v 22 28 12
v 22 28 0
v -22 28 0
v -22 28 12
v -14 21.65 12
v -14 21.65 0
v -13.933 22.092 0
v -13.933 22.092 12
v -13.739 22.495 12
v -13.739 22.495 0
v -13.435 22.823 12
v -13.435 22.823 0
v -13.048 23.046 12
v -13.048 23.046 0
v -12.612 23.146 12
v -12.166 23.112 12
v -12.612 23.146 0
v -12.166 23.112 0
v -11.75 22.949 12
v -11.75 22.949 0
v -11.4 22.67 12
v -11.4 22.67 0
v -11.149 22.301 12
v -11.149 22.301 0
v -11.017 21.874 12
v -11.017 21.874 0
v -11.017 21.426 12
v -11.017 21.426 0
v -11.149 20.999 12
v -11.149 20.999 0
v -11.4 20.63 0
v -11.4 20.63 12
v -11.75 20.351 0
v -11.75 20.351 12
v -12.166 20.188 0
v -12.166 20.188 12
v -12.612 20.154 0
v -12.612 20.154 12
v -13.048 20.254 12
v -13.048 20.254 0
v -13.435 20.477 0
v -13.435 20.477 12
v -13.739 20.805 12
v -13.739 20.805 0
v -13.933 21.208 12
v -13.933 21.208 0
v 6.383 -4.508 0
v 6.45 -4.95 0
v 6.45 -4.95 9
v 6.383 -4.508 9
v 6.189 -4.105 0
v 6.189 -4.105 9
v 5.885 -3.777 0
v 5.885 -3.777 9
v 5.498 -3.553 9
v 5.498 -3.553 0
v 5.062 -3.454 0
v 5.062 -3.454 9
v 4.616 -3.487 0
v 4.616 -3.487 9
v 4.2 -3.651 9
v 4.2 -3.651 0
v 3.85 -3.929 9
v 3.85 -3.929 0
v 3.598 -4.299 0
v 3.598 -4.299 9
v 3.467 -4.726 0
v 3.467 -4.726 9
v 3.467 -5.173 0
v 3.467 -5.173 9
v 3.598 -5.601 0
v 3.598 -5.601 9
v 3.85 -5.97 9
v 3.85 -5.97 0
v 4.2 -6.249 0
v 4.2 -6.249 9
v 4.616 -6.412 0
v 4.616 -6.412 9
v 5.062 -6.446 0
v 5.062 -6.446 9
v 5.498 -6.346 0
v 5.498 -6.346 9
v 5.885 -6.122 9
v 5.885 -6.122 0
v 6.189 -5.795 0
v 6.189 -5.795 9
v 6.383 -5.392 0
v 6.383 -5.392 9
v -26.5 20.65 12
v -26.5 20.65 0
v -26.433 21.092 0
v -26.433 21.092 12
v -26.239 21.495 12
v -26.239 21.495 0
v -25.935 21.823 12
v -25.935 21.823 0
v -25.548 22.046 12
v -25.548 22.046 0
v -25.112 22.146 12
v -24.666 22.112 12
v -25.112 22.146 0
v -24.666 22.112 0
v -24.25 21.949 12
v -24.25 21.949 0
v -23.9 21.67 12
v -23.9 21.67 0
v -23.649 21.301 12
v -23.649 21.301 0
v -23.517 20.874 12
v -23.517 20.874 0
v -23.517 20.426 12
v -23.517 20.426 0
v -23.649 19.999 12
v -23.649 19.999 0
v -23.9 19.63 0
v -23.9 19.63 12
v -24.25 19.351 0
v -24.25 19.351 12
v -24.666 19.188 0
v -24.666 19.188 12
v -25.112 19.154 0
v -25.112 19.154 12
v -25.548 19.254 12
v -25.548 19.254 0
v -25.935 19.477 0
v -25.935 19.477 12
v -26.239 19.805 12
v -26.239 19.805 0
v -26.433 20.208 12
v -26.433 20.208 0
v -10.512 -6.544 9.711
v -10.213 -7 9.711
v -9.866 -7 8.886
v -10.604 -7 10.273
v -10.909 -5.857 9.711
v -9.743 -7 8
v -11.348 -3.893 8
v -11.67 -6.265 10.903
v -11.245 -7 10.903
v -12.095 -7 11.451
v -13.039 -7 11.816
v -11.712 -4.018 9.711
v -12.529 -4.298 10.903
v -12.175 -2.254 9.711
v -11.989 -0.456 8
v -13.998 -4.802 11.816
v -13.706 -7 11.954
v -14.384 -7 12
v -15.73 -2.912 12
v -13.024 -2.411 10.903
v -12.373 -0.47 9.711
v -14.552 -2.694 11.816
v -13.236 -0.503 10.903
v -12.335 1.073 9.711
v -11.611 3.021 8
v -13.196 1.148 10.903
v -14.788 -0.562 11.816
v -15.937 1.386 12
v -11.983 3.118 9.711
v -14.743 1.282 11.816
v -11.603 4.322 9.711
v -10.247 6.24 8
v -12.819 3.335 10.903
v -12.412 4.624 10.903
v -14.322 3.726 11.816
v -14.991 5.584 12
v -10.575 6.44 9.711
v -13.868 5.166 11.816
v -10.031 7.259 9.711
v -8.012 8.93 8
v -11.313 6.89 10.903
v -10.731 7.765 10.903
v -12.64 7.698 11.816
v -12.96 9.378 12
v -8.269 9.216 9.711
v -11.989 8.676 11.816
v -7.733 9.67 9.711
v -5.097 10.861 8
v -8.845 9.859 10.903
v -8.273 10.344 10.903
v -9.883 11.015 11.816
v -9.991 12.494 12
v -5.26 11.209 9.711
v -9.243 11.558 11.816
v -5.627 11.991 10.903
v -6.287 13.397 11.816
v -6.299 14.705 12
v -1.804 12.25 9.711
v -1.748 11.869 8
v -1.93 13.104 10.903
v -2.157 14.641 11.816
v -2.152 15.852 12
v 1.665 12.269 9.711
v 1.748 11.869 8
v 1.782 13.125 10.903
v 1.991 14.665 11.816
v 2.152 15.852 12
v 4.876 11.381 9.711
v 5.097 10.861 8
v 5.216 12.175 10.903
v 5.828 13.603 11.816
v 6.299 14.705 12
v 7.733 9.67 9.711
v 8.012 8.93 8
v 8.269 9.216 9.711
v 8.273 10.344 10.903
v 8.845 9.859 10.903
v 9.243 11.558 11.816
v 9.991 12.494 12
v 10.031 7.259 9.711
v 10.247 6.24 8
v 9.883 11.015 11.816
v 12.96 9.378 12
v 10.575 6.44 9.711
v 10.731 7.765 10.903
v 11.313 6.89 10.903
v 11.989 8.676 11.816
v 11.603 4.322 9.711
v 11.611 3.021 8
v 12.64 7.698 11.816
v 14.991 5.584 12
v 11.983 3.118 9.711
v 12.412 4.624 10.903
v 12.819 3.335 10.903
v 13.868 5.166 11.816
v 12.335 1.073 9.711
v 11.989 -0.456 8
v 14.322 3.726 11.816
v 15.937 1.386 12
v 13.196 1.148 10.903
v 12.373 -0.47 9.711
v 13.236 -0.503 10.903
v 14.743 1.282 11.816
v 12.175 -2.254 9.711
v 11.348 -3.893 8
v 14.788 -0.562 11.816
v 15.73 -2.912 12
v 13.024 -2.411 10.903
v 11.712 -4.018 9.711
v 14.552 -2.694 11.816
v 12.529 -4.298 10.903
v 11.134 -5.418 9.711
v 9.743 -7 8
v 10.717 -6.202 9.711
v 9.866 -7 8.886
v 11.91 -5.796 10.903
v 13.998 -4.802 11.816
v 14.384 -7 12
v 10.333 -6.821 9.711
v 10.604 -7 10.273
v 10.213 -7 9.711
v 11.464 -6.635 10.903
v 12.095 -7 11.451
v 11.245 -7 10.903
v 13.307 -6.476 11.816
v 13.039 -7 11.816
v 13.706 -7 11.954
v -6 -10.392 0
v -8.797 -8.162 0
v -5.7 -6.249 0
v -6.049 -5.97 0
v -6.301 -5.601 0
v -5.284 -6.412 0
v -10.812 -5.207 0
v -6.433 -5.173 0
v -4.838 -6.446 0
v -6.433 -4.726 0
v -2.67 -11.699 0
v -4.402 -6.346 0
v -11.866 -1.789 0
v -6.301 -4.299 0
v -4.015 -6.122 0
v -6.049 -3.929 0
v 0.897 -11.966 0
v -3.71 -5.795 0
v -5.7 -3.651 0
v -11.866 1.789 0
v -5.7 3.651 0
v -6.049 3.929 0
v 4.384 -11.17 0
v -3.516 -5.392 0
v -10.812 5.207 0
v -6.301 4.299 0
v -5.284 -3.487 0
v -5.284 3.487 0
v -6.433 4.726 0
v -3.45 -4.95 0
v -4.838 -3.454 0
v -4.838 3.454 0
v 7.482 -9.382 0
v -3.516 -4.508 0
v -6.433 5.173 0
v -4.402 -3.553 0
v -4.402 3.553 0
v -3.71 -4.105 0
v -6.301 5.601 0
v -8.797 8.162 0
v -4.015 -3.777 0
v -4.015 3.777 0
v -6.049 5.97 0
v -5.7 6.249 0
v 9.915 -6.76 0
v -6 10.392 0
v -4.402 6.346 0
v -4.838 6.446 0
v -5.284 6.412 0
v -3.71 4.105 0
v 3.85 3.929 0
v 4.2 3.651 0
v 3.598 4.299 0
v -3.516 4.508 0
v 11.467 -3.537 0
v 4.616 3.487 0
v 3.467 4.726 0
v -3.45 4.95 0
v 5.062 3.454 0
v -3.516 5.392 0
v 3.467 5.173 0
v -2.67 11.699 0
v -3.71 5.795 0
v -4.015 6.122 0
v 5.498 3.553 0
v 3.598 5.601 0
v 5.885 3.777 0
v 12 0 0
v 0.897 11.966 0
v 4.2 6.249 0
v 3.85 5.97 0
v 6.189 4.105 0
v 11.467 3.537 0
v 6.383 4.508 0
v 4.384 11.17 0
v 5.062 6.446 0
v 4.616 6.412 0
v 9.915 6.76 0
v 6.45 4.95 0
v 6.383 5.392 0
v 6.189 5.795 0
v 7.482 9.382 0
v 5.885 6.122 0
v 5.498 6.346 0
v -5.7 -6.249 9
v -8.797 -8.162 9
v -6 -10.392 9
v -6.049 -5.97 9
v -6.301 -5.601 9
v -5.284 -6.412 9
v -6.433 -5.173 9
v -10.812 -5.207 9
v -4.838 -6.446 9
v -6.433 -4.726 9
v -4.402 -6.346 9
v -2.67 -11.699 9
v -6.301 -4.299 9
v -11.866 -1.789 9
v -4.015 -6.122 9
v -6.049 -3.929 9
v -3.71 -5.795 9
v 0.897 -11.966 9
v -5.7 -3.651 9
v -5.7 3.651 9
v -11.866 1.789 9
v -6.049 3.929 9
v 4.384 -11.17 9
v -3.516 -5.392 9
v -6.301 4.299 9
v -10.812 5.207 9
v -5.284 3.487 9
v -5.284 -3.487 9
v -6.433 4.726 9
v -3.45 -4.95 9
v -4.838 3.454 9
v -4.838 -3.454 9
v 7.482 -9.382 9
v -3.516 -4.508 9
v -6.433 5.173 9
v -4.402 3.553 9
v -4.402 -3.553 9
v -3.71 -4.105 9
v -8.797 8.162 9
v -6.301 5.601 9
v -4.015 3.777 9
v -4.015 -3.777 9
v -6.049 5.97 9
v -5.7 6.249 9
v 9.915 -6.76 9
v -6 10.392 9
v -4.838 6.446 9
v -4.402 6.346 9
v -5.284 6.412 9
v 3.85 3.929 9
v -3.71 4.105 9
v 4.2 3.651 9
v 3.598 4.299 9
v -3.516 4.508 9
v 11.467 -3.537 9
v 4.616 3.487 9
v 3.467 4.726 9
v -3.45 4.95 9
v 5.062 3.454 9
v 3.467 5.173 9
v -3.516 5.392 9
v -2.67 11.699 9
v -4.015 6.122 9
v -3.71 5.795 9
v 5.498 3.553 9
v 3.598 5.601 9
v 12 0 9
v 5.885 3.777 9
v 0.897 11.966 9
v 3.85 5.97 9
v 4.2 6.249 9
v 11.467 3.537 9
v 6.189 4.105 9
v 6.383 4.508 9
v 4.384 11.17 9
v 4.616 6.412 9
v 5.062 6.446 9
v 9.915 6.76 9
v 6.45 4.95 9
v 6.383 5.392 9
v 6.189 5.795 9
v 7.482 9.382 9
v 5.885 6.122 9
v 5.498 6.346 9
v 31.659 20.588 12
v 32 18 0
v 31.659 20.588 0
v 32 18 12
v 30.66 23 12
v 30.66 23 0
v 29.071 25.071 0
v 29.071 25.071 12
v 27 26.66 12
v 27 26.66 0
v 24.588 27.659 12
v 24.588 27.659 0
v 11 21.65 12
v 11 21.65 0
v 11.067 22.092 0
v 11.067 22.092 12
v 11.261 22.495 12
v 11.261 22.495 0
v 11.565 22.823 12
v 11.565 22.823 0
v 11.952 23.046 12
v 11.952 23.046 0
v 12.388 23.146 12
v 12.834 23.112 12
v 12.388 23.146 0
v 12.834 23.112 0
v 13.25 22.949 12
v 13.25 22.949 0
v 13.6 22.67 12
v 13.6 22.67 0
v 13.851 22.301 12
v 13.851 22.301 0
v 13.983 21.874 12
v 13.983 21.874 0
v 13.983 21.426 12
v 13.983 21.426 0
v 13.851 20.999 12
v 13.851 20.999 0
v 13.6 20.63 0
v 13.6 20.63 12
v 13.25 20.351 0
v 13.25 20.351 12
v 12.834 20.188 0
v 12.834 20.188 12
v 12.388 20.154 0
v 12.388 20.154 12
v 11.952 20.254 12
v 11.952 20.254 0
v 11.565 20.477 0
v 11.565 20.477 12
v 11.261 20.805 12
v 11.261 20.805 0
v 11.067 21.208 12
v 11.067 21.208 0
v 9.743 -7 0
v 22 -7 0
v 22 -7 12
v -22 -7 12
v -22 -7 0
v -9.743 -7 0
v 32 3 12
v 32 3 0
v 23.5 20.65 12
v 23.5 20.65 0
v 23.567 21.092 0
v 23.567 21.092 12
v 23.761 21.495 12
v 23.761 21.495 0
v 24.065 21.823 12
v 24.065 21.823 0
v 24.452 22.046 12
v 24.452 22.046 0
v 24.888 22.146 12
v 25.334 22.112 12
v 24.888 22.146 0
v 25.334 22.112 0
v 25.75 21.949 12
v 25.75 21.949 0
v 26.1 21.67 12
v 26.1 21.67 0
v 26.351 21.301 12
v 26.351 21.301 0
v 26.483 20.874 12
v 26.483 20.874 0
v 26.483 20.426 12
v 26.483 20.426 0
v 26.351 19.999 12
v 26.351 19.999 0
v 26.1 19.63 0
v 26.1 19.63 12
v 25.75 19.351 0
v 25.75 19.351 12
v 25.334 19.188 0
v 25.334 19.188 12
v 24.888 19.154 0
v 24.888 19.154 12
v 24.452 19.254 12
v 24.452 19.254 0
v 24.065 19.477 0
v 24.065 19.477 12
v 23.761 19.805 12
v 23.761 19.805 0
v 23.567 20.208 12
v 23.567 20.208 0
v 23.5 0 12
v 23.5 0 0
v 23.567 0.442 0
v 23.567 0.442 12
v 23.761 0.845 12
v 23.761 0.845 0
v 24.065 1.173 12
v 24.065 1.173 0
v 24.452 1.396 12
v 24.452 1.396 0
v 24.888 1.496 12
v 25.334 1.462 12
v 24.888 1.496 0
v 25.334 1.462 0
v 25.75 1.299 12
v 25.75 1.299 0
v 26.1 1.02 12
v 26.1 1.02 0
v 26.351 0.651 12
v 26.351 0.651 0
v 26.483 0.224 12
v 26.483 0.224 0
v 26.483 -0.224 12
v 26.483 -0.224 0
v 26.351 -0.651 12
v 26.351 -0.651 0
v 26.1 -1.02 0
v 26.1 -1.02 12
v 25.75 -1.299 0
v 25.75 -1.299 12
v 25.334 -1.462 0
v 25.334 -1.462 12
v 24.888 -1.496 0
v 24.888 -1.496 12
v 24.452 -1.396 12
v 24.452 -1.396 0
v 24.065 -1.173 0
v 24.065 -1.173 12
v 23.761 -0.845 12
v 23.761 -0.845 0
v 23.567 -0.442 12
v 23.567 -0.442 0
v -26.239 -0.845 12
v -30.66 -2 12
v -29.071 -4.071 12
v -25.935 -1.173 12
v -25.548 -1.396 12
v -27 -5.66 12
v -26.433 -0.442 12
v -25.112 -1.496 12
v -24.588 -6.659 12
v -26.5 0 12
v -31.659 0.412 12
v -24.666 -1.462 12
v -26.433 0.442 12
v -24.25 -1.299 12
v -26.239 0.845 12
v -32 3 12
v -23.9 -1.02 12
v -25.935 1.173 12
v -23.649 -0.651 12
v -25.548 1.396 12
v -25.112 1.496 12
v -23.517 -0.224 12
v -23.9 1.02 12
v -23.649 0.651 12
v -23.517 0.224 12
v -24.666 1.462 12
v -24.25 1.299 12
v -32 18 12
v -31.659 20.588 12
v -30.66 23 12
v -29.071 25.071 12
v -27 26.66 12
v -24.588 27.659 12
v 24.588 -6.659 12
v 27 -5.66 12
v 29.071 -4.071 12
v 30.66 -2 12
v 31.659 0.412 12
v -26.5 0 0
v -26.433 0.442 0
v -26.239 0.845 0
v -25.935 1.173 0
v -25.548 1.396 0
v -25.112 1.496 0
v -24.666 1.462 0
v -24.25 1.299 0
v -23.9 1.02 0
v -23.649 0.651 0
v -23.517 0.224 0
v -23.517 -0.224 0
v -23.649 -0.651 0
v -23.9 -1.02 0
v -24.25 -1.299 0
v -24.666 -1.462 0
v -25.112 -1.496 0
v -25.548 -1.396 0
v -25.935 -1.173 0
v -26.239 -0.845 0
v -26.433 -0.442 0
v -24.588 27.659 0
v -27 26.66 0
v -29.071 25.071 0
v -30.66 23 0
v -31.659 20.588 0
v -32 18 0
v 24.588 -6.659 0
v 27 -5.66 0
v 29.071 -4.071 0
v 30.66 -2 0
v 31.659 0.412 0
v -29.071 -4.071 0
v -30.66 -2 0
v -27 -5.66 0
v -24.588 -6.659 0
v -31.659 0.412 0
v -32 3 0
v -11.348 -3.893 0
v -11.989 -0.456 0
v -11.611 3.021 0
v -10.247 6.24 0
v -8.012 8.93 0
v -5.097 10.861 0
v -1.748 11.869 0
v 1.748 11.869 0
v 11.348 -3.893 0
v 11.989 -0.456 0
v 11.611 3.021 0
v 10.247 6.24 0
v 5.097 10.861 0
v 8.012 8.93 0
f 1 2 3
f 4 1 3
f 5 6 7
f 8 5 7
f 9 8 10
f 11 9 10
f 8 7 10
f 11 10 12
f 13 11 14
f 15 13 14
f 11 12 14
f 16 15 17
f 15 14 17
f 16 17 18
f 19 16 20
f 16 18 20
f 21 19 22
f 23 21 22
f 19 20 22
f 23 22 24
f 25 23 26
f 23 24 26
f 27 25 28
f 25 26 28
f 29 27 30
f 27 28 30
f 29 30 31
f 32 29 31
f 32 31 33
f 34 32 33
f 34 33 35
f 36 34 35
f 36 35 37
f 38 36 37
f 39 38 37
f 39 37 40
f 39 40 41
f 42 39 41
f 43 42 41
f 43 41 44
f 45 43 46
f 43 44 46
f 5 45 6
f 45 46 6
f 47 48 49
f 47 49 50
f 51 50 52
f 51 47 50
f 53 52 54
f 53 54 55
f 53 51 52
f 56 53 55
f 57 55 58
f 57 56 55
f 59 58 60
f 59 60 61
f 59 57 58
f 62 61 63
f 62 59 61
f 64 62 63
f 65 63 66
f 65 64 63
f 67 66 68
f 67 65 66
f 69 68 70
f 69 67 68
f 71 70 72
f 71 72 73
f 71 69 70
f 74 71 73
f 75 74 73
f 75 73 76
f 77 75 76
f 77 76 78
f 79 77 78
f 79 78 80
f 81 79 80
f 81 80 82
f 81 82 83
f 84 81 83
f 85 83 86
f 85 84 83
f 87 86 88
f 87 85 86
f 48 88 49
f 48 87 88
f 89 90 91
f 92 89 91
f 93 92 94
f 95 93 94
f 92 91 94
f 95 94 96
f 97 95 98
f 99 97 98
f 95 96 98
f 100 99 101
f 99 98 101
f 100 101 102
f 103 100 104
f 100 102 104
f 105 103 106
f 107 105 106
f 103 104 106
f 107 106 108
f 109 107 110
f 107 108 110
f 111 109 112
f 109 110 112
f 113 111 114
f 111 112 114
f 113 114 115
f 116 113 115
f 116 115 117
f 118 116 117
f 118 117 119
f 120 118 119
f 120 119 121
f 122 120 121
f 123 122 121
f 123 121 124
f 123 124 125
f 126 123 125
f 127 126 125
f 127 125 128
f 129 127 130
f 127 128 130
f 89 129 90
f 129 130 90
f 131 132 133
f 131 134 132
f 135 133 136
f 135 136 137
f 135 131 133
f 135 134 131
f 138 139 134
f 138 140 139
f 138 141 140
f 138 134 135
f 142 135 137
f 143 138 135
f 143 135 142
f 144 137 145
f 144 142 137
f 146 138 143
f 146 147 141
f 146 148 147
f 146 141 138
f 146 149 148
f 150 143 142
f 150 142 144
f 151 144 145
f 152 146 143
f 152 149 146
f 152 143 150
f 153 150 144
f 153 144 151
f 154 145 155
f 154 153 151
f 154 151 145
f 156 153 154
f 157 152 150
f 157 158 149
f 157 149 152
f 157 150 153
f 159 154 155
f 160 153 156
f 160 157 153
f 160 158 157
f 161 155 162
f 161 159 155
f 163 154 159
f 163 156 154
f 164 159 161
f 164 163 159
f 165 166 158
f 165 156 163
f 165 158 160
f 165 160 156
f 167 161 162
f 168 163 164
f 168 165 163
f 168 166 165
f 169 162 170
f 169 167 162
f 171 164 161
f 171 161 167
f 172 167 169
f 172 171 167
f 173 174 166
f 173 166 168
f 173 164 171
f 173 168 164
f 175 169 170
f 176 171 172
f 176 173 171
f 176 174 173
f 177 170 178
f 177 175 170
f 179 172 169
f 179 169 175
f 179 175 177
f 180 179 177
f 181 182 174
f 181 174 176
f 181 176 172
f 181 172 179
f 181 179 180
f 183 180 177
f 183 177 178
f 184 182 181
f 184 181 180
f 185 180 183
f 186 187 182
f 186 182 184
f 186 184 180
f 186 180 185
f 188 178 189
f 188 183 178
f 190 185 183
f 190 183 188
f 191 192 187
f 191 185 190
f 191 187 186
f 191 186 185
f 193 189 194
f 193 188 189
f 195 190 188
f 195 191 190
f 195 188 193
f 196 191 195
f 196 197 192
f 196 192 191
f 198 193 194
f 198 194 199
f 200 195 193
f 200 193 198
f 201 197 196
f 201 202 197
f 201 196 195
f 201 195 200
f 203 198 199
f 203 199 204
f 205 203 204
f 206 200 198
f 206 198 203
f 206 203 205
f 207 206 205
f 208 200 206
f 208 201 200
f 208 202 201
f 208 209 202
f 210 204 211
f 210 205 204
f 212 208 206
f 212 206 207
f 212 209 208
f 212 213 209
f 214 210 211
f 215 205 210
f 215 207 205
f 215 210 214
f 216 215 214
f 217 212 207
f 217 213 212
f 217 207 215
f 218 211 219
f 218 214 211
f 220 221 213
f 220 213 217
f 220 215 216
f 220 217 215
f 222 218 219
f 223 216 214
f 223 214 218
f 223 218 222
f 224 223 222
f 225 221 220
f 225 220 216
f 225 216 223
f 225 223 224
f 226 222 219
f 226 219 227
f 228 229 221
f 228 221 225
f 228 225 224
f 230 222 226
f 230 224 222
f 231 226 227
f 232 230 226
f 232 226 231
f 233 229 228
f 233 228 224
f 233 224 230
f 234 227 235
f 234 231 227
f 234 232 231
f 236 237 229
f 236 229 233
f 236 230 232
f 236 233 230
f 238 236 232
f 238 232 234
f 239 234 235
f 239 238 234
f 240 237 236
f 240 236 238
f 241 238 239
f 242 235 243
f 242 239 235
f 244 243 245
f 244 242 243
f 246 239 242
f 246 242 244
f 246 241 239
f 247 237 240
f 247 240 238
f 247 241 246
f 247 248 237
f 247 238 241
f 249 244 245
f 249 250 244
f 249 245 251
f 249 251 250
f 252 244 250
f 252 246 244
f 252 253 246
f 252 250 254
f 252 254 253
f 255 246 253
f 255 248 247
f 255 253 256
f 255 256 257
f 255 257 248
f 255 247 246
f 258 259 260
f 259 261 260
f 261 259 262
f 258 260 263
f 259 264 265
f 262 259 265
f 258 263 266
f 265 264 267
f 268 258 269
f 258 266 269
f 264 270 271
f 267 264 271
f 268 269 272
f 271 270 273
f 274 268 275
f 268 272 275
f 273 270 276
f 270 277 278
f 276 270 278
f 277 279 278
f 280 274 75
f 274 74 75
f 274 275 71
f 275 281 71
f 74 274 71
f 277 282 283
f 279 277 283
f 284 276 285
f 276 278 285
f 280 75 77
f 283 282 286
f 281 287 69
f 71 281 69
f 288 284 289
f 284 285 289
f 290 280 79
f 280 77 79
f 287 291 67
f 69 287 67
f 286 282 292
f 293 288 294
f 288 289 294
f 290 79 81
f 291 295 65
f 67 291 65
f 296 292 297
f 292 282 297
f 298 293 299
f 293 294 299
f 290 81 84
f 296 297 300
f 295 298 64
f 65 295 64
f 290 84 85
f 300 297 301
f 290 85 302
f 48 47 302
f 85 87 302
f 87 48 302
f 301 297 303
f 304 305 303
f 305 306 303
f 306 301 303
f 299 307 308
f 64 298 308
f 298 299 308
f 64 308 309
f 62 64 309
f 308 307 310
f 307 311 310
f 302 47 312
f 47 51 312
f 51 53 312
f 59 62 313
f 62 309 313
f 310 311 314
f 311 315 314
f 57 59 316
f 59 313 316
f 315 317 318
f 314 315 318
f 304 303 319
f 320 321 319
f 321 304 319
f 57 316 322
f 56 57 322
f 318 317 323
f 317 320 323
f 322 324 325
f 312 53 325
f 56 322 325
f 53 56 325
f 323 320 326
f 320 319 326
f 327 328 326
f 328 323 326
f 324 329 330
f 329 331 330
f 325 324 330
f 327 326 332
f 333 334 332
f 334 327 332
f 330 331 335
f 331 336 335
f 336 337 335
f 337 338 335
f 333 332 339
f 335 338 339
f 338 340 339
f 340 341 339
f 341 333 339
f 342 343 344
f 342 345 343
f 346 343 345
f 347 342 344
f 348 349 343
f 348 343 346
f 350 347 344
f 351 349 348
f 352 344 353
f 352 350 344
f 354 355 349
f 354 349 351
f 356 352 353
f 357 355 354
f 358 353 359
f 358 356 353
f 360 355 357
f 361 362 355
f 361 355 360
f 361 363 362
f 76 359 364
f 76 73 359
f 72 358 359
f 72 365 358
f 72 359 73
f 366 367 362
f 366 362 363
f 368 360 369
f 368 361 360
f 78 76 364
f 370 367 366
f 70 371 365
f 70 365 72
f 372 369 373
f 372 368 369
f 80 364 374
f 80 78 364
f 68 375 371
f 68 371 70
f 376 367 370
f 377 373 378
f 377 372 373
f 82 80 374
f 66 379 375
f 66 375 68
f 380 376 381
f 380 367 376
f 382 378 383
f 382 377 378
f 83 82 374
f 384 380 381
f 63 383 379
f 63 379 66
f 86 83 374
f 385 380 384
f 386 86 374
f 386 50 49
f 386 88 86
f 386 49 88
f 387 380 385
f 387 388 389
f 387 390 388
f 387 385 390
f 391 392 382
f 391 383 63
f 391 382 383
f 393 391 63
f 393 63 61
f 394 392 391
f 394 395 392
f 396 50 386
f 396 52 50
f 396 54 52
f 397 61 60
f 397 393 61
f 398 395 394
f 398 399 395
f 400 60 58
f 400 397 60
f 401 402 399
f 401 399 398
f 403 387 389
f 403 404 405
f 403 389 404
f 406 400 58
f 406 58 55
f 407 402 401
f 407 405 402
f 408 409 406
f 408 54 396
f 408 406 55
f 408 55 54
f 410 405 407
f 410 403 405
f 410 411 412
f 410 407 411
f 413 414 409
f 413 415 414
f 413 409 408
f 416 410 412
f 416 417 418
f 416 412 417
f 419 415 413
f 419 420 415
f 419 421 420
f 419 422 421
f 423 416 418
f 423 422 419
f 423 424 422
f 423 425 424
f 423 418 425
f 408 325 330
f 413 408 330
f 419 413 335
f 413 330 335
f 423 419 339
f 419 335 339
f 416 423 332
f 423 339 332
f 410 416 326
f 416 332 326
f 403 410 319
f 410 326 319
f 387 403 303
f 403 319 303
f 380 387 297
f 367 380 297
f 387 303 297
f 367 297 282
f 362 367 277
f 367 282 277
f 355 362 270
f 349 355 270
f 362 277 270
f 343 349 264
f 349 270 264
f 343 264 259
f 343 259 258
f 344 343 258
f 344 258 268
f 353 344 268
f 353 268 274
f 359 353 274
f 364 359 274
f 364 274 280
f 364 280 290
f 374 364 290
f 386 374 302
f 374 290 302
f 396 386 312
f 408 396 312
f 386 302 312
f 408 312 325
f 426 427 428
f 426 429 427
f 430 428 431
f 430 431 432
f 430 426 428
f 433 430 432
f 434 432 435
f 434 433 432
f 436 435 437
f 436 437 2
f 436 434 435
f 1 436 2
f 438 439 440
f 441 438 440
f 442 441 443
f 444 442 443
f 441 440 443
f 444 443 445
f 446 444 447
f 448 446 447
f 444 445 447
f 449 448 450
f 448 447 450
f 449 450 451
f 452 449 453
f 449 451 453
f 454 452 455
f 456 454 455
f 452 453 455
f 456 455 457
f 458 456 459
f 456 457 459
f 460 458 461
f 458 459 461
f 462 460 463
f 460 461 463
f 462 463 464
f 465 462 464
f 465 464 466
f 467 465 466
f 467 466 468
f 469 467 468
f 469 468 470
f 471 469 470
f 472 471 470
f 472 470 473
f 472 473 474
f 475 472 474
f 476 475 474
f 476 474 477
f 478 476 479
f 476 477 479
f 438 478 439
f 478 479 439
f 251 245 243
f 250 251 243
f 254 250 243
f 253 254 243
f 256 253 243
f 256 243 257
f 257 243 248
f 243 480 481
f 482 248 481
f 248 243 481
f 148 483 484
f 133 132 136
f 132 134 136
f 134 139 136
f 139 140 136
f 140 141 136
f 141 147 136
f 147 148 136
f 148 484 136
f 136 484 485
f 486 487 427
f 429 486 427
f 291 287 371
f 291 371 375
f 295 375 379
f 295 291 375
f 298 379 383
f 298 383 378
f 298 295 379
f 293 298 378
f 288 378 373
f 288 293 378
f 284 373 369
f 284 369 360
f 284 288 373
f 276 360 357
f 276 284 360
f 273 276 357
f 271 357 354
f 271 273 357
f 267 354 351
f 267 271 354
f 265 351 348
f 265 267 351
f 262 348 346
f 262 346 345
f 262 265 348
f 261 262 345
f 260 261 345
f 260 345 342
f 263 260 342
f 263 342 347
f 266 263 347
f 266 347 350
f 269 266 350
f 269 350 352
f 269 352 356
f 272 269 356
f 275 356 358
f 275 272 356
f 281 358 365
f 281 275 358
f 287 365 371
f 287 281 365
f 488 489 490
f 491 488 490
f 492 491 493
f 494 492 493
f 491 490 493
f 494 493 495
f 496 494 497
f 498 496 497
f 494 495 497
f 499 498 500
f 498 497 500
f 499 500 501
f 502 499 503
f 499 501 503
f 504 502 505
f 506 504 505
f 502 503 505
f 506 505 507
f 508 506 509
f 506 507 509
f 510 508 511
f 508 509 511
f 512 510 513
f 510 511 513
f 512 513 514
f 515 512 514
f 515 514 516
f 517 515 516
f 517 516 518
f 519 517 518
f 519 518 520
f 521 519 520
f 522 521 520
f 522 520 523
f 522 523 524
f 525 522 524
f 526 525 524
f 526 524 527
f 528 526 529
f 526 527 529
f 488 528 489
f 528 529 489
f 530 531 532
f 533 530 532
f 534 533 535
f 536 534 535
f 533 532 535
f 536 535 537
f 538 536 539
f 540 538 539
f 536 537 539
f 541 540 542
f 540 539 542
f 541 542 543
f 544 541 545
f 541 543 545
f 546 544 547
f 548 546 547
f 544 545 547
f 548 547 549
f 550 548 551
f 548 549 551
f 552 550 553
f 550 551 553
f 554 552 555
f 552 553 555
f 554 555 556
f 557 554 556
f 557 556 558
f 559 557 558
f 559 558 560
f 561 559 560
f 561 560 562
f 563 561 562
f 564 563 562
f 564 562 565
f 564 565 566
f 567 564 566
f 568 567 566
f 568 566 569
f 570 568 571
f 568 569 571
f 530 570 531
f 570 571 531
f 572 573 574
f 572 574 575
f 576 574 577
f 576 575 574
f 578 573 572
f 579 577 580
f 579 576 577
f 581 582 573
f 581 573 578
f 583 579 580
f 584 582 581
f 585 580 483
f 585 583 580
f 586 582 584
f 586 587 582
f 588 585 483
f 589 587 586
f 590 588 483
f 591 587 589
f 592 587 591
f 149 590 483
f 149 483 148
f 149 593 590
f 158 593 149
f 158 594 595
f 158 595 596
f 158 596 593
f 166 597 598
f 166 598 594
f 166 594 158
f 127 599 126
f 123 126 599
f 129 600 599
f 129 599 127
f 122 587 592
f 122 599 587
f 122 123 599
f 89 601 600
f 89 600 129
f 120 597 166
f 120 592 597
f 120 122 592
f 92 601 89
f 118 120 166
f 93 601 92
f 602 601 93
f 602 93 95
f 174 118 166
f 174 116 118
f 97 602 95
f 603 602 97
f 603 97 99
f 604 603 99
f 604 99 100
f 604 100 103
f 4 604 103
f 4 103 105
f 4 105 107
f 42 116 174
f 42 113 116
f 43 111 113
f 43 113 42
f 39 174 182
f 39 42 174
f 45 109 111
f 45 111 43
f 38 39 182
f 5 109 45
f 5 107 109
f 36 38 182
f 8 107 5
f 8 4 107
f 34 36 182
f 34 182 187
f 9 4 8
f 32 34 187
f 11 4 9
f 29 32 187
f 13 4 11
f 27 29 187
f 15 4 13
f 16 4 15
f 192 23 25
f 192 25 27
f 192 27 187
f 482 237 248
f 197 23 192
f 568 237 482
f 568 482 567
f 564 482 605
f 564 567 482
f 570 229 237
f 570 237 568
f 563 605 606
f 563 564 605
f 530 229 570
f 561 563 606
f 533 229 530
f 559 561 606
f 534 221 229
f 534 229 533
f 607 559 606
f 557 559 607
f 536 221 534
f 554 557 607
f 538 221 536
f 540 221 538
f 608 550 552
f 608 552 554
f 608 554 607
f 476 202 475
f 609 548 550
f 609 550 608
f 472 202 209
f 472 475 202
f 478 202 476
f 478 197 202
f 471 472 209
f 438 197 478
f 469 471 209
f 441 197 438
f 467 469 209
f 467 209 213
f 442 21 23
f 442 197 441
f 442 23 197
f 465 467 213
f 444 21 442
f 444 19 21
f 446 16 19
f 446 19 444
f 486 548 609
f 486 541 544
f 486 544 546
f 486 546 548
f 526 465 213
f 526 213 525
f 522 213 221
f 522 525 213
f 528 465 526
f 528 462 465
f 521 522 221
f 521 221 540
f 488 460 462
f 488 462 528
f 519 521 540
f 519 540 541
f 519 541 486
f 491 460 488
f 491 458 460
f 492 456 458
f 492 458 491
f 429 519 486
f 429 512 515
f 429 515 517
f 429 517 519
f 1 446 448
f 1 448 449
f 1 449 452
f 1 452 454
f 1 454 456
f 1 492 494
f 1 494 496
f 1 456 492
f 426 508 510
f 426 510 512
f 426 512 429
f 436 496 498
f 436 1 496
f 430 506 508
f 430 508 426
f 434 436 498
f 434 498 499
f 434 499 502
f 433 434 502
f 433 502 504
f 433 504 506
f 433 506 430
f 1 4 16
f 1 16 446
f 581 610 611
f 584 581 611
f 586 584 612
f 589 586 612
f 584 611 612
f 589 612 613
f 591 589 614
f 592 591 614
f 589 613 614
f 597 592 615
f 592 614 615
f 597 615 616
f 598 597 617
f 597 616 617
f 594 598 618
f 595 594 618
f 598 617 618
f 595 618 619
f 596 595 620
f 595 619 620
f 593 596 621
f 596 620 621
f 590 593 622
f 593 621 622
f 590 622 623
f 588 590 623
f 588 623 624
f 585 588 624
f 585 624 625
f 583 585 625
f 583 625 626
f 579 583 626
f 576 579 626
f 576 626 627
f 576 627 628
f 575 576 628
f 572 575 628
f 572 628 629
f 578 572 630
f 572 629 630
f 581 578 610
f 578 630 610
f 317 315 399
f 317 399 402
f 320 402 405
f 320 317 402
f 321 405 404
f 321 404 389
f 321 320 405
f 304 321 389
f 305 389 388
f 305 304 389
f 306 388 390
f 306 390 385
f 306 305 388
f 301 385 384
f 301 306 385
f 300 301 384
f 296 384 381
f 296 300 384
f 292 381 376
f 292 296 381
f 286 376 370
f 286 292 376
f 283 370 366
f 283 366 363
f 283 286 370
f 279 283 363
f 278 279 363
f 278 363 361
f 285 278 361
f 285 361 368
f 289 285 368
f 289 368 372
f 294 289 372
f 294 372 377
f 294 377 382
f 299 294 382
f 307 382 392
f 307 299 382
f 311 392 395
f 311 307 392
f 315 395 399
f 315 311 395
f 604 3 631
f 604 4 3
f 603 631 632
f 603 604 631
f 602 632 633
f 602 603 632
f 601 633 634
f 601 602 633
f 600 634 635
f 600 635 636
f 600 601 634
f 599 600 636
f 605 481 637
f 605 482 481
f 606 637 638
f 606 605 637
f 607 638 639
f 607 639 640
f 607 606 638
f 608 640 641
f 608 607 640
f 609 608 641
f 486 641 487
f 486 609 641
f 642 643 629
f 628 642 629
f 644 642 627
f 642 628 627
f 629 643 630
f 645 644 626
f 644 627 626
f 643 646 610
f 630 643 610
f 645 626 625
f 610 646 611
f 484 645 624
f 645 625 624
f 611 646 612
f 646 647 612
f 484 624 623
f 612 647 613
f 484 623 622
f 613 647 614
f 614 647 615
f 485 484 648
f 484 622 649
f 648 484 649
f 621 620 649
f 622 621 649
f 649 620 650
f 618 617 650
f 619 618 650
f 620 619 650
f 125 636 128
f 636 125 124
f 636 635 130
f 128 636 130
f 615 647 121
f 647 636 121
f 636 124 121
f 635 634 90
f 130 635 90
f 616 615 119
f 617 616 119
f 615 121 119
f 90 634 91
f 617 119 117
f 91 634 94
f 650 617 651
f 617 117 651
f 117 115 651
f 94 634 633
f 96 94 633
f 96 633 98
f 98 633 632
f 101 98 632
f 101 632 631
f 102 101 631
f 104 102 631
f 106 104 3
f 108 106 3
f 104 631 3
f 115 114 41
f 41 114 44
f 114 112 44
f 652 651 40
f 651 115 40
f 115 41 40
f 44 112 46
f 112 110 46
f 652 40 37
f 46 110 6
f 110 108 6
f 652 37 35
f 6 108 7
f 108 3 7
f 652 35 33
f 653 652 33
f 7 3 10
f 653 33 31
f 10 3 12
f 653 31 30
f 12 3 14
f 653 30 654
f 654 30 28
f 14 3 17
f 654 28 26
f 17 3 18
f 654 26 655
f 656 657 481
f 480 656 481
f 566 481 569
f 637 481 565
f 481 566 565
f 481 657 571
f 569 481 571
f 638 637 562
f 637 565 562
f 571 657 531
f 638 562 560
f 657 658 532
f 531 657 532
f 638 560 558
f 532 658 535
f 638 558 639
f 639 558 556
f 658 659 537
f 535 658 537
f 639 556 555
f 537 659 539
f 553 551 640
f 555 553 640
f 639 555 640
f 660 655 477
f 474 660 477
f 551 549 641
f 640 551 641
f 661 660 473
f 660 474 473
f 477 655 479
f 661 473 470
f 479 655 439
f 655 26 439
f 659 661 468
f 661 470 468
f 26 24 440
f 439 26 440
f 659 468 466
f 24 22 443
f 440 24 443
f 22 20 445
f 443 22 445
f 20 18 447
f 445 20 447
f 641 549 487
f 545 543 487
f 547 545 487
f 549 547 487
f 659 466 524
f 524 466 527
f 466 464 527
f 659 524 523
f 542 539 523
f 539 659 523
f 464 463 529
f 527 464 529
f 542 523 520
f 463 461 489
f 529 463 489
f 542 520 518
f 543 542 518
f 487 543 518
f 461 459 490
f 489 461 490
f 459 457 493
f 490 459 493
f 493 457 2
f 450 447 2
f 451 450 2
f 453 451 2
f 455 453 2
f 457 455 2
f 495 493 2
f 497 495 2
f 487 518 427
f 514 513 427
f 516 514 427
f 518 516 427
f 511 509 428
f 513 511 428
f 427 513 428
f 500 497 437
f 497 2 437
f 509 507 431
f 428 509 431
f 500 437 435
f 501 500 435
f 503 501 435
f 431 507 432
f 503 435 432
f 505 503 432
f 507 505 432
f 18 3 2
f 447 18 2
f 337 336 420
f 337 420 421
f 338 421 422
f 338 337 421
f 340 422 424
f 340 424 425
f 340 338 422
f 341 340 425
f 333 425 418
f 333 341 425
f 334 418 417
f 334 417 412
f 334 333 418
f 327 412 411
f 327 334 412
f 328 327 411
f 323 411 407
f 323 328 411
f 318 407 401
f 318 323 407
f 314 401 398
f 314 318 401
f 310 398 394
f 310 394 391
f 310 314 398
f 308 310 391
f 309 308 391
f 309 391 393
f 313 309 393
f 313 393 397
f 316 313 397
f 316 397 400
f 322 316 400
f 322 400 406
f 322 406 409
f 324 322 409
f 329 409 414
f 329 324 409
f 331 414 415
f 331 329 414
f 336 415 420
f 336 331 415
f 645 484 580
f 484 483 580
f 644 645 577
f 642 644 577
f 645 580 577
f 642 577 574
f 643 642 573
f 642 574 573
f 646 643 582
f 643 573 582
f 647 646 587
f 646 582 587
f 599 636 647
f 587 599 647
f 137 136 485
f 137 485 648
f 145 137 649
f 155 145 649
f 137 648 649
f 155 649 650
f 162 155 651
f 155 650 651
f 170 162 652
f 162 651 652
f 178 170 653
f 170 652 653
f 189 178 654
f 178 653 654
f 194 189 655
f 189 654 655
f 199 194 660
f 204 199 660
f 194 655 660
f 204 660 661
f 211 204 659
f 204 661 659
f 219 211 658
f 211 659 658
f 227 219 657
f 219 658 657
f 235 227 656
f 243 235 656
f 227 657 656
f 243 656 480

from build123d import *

# Parameters (mm, degrees)
SKETCH_1_R      = 12
SKETCH_1_R_2    = 1.5
EXTRUDE_1_DEPTH = 9
SKETCH_2_R      = 1.5
EXTRUDE_2_DEPTH = 12
FILLET_2_R      = 4
FILLET_3_R      = 10


with BuildPart() as part:
    # 草图1 → 凸台-拉伸1 (new body)
    with BuildSketch(Plane.XY):
        Circle(SKETCH_1_R)
        with Locations((-4.949747468, 4.949747468)):
            Circle(SKETCH_1_R_2, mode=Mode.SUBTRACT)
        with Locations((4.949747468, 4.949747468)):
            Circle(SKETCH_1_R_2, mode=Mode.SUBTRACT)
        with Locations((-4.949747468, -4.949747468)):
            Circle(SKETCH_1_R_2, mode=Mode.SUBTRACT)
        with Locations((4.949747468, -4.949747468)):
            Circle(SKETCH_1_R_2, mode=Mode.SUBTRACT)
    extrude(amount=EXTRUDE_1_DEPTH)


with BuildPart() as body_2:
    # 草图2 → 凸台-拉伸2 (new body)
    with BuildSketch(Plane(origin=(0, 0, 0), x_dir=(-1, 0, 0), z_dir=(0, 0, -1))):
        with BuildLine():
            Line((-18, -7), (-32, -7))
            Line((-32, -7), (-32, 28))
            Line((-32, 28), (32, 28))
            Line((32, 28), (32, -7))
            Line((32, -7), (18, -7))
            Line((18, -7), (9.7434736, -7))
            ThreePointArc((9.7434736, -7), (0, 11.997302938), (-9.7434736, -7))
            Line((-9.7434736, -7), (-18, -7))
        make_face()
        with Locations((-12.5, 21.65)):
            Circle(SKETCH_2_R, mode=Mode.SUBTRACT)
        with Locations((12.5, 21.65)):
            Circle(SKETCH_2_R, mode=Mode.SUBTRACT)
        with Locations((-25, 20.65)):
            Circle(SKETCH_2_R, mode=Mode.SUBTRACT)
        with Locations((25, 20.65)):
            Circle(SKETCH_2_R, mode=Mode.SUBTRACT)
        with Locations((-25, 0)):
            Circle(SKETCH_2_R, mode=Mode.SUBTRACT)
        with Locations((25, 0)):
            Circle(SKETCH_2_R, mode=Mode.SUBTRACT)
    extrude(amount=-EXTRUDE_2_DEPTH)

    # 圆角2
    fillet_2_edges = [body_2.edges().sort_by_distance(p)[0] for p in [
        (0, 11.997302938, 12),
    ]]
    fillet(fillet_2_edges, radius=FILLET_2_R)

    # 圆角3
    fillet_3_edges = [body_2.edges().sort_by_distance(p)[0] for p in [
        (32, 28, 6),
        (-32, 28, 6),
        (-32, -7, 6),
        (32, -7, 6),
    ]]
    fillet(fillet_3_edges, radius=FILLET_3_R)


solid = Compound([part.part, body_2.part])
